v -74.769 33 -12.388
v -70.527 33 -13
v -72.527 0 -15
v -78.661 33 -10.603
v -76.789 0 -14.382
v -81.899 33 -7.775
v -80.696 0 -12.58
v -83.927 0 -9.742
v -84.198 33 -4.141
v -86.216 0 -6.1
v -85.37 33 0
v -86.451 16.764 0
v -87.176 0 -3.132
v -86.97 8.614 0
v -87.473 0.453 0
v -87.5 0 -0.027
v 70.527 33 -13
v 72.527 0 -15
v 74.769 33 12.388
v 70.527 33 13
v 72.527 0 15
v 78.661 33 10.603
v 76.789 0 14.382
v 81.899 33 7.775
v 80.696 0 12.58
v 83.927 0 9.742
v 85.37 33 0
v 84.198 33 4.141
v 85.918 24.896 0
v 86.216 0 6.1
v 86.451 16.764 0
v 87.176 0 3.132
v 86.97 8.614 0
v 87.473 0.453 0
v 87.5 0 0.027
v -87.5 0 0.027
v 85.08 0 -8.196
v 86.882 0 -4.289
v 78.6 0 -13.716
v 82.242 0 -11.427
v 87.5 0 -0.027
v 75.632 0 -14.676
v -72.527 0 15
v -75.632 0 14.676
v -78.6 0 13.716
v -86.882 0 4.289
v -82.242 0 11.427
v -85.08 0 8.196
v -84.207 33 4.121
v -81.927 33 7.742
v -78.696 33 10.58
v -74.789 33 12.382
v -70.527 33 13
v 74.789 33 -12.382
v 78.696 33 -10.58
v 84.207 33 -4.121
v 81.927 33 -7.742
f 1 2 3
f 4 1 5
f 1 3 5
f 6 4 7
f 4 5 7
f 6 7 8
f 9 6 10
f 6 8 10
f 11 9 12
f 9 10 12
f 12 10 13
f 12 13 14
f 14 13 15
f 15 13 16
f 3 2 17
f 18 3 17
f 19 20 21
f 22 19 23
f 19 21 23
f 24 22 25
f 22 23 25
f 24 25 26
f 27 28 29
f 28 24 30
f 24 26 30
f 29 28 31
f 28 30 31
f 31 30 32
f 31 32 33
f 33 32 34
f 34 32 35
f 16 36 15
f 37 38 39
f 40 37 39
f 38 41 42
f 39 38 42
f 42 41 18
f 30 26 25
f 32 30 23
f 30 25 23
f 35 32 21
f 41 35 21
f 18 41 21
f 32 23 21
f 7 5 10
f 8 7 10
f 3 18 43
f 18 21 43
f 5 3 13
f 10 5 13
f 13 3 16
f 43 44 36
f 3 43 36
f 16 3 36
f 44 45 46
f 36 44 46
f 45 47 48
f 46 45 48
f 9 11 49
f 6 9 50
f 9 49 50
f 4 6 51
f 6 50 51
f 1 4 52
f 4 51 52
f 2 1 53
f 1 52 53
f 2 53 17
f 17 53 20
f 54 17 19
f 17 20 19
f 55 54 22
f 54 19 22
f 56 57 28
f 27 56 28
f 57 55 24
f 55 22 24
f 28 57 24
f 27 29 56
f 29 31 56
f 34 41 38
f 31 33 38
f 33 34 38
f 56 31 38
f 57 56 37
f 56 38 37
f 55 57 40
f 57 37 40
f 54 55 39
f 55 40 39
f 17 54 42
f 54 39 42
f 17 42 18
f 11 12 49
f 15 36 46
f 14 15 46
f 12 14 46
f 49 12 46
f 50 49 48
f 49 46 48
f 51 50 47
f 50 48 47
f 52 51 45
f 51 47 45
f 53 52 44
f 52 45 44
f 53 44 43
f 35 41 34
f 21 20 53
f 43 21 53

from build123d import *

# Parameters (mm, degrees)
FILLET_1_R = 15


with BuildPart() as part:
    # 草图1 → 放样1 section 0
    with BuildSketch(Plane(origin=(0, 0, 0), x_dir=(1, 0, 0), z_dir=(0, 1, 0))):
        with BuildLine():
            Line((87.50000000000003, -14.999999999999991), (-87.49999999999997, -15.000000000000012))
            Line((-87.49999999999997, -15.000000000000012), (-87.49999999999997, 14.999999999999986))
            Line((-87.49999999999997, 14.999999999999986), (87.50000000000003, 15.000000000000007))
            Line((87.50000000000003, 15.000000000000007), (87.50000000000003, -14.999999999999991))
        make_face()
    # 草图2 → 放样1 section 1
    with BuildSketch(Plane(origin=(0, 33, 0), x_dir=(1, 0, 0), z_dir=(0, 1, 0))):
        with BuildLine():
            Line((85.50000000000001, 13.000000000000007), (-85.49999999999997, 13.000000000000007))
            Line((-85.49999999999997, 13.000000000000007), (-85.49999999999997, -12.999999999999991))
            Line((-85.49999999999997, -12.999999999999991), (85.50000000000001, -12.999999999999991))
            Line((85.50000000000001, -12.999999999999991), (85.50000000000001, 13.000000000000007))
        make_face()
    loft()

    # 圆角1
    # the kernel refuses this fillet: 15 mm, written as the material it takes off along each edge
    with BuildSketch(Plane(origin=(89.75615314494081, -37.226526891522596, -17.25615314494077), x_dir=(-0.99817518096122, -0.0602740731413001, -0.0036529741297753678), z_dir=(-0.06038466786391727, 0.9963470197546278, 0.06038466786391684))) as fillet_1_piece_1:
        with BuildLine():
            CenterArc((FILLET_1_R * 0.996347019755, FILLET_1_R), FILLET_1_R, 180.20968310121904, 89.79031689878093)
            Line((-FILLET_1_R * 0.00364628369535, FILLET_1_R * 0.996340347667), (0, 0))
            Line((0, 0), (FILLET_1_R * 0.996347019755, 1e-17))
        make_face()
    extrude(amount=107.84701680495597, mode=Mode.SUBTRACT)
    with BuildSketch(Plane(origin=(89.7561531449408, -37.226526891522376, 17.25615314494074), x_dir=(-0.9981751809612202, -0.06027407314129964, 0.003652974129776053), z_dir=(-0.06038466786391684, 0.9963470197546278, -0.06038466786391684))) as fillet_1_piece_2:
        with BuildLine():
            CenterArc((FILLET_1_R * 0.996347019755, -FILLET_1_R), FILLET_1_R, 89.99999999999999, 89.79031689878094)
            Line((-FILLET_1_R * 0.00364628369535, -FILLET_1_R * 0.996340347667), (0, 0))
            Line((0, 0), (FILLET_1_R * 0.996347019755, 0))
        make_face()
    extrude(amount=107.84701680495557, mode=Mode.SUBTRACT)
    with BuildSketch(Plane(origin=(-89.75615314494071, -37.226526891522205, -17.256153144940704), x_dir=(-0.0036529741297760742, -0.06027407314129905, 0.9981751809612202), z_dir=(0.06038466786391684, 0.9963470197546278, 0.06038466786391625))) as fillet_1_piece_3:
        with BuildLine():
            CenterArc((FILLET_1_R * 0.996347019755, FILLET_1_R), FILLET_1_R, 180.20968310121907, 89.79031689878093)
            Line((-FILLET_1_R * 0.00364628369535, FILLET_1_R * 0.996340347667), (0, 0))
            Line((0, 0), (FILLET_1_R * 0.996347019755, -1e-17))
        make_face()
    extrude(amount=107.84701680495523, mode=Mode.SUBTRACT)
    with BuildSketch(Plane(origin=(-89.75615314494074, -37.22652689152266, 17.256153144940804), x_dir=(0.99817518096122, -0.060274073141299664, 0.0036529741297756076), z_dir=(0.06038466786391684, 0.9963470197546278, -0.06038466786391748))) as fillet_1_piece_4:
        with BuildLine():
            CenterArc((FILLET_1_R * 0.996347019755, FILLET_1_R), FILLET_1_R, 180.20968310121904, 89.79031689878093)
            Line((-FILLET_1_R * 0.00364628369535, FILLET_1_R * 0.996340347667), (0, 0))
            Line((0, 0), (FILLET_1_R * 0.996347019755, 0))
        make_face()
    extrude(amount=107.84701680495613, mode=Mode.SUBTRACT)


solid = part.part
